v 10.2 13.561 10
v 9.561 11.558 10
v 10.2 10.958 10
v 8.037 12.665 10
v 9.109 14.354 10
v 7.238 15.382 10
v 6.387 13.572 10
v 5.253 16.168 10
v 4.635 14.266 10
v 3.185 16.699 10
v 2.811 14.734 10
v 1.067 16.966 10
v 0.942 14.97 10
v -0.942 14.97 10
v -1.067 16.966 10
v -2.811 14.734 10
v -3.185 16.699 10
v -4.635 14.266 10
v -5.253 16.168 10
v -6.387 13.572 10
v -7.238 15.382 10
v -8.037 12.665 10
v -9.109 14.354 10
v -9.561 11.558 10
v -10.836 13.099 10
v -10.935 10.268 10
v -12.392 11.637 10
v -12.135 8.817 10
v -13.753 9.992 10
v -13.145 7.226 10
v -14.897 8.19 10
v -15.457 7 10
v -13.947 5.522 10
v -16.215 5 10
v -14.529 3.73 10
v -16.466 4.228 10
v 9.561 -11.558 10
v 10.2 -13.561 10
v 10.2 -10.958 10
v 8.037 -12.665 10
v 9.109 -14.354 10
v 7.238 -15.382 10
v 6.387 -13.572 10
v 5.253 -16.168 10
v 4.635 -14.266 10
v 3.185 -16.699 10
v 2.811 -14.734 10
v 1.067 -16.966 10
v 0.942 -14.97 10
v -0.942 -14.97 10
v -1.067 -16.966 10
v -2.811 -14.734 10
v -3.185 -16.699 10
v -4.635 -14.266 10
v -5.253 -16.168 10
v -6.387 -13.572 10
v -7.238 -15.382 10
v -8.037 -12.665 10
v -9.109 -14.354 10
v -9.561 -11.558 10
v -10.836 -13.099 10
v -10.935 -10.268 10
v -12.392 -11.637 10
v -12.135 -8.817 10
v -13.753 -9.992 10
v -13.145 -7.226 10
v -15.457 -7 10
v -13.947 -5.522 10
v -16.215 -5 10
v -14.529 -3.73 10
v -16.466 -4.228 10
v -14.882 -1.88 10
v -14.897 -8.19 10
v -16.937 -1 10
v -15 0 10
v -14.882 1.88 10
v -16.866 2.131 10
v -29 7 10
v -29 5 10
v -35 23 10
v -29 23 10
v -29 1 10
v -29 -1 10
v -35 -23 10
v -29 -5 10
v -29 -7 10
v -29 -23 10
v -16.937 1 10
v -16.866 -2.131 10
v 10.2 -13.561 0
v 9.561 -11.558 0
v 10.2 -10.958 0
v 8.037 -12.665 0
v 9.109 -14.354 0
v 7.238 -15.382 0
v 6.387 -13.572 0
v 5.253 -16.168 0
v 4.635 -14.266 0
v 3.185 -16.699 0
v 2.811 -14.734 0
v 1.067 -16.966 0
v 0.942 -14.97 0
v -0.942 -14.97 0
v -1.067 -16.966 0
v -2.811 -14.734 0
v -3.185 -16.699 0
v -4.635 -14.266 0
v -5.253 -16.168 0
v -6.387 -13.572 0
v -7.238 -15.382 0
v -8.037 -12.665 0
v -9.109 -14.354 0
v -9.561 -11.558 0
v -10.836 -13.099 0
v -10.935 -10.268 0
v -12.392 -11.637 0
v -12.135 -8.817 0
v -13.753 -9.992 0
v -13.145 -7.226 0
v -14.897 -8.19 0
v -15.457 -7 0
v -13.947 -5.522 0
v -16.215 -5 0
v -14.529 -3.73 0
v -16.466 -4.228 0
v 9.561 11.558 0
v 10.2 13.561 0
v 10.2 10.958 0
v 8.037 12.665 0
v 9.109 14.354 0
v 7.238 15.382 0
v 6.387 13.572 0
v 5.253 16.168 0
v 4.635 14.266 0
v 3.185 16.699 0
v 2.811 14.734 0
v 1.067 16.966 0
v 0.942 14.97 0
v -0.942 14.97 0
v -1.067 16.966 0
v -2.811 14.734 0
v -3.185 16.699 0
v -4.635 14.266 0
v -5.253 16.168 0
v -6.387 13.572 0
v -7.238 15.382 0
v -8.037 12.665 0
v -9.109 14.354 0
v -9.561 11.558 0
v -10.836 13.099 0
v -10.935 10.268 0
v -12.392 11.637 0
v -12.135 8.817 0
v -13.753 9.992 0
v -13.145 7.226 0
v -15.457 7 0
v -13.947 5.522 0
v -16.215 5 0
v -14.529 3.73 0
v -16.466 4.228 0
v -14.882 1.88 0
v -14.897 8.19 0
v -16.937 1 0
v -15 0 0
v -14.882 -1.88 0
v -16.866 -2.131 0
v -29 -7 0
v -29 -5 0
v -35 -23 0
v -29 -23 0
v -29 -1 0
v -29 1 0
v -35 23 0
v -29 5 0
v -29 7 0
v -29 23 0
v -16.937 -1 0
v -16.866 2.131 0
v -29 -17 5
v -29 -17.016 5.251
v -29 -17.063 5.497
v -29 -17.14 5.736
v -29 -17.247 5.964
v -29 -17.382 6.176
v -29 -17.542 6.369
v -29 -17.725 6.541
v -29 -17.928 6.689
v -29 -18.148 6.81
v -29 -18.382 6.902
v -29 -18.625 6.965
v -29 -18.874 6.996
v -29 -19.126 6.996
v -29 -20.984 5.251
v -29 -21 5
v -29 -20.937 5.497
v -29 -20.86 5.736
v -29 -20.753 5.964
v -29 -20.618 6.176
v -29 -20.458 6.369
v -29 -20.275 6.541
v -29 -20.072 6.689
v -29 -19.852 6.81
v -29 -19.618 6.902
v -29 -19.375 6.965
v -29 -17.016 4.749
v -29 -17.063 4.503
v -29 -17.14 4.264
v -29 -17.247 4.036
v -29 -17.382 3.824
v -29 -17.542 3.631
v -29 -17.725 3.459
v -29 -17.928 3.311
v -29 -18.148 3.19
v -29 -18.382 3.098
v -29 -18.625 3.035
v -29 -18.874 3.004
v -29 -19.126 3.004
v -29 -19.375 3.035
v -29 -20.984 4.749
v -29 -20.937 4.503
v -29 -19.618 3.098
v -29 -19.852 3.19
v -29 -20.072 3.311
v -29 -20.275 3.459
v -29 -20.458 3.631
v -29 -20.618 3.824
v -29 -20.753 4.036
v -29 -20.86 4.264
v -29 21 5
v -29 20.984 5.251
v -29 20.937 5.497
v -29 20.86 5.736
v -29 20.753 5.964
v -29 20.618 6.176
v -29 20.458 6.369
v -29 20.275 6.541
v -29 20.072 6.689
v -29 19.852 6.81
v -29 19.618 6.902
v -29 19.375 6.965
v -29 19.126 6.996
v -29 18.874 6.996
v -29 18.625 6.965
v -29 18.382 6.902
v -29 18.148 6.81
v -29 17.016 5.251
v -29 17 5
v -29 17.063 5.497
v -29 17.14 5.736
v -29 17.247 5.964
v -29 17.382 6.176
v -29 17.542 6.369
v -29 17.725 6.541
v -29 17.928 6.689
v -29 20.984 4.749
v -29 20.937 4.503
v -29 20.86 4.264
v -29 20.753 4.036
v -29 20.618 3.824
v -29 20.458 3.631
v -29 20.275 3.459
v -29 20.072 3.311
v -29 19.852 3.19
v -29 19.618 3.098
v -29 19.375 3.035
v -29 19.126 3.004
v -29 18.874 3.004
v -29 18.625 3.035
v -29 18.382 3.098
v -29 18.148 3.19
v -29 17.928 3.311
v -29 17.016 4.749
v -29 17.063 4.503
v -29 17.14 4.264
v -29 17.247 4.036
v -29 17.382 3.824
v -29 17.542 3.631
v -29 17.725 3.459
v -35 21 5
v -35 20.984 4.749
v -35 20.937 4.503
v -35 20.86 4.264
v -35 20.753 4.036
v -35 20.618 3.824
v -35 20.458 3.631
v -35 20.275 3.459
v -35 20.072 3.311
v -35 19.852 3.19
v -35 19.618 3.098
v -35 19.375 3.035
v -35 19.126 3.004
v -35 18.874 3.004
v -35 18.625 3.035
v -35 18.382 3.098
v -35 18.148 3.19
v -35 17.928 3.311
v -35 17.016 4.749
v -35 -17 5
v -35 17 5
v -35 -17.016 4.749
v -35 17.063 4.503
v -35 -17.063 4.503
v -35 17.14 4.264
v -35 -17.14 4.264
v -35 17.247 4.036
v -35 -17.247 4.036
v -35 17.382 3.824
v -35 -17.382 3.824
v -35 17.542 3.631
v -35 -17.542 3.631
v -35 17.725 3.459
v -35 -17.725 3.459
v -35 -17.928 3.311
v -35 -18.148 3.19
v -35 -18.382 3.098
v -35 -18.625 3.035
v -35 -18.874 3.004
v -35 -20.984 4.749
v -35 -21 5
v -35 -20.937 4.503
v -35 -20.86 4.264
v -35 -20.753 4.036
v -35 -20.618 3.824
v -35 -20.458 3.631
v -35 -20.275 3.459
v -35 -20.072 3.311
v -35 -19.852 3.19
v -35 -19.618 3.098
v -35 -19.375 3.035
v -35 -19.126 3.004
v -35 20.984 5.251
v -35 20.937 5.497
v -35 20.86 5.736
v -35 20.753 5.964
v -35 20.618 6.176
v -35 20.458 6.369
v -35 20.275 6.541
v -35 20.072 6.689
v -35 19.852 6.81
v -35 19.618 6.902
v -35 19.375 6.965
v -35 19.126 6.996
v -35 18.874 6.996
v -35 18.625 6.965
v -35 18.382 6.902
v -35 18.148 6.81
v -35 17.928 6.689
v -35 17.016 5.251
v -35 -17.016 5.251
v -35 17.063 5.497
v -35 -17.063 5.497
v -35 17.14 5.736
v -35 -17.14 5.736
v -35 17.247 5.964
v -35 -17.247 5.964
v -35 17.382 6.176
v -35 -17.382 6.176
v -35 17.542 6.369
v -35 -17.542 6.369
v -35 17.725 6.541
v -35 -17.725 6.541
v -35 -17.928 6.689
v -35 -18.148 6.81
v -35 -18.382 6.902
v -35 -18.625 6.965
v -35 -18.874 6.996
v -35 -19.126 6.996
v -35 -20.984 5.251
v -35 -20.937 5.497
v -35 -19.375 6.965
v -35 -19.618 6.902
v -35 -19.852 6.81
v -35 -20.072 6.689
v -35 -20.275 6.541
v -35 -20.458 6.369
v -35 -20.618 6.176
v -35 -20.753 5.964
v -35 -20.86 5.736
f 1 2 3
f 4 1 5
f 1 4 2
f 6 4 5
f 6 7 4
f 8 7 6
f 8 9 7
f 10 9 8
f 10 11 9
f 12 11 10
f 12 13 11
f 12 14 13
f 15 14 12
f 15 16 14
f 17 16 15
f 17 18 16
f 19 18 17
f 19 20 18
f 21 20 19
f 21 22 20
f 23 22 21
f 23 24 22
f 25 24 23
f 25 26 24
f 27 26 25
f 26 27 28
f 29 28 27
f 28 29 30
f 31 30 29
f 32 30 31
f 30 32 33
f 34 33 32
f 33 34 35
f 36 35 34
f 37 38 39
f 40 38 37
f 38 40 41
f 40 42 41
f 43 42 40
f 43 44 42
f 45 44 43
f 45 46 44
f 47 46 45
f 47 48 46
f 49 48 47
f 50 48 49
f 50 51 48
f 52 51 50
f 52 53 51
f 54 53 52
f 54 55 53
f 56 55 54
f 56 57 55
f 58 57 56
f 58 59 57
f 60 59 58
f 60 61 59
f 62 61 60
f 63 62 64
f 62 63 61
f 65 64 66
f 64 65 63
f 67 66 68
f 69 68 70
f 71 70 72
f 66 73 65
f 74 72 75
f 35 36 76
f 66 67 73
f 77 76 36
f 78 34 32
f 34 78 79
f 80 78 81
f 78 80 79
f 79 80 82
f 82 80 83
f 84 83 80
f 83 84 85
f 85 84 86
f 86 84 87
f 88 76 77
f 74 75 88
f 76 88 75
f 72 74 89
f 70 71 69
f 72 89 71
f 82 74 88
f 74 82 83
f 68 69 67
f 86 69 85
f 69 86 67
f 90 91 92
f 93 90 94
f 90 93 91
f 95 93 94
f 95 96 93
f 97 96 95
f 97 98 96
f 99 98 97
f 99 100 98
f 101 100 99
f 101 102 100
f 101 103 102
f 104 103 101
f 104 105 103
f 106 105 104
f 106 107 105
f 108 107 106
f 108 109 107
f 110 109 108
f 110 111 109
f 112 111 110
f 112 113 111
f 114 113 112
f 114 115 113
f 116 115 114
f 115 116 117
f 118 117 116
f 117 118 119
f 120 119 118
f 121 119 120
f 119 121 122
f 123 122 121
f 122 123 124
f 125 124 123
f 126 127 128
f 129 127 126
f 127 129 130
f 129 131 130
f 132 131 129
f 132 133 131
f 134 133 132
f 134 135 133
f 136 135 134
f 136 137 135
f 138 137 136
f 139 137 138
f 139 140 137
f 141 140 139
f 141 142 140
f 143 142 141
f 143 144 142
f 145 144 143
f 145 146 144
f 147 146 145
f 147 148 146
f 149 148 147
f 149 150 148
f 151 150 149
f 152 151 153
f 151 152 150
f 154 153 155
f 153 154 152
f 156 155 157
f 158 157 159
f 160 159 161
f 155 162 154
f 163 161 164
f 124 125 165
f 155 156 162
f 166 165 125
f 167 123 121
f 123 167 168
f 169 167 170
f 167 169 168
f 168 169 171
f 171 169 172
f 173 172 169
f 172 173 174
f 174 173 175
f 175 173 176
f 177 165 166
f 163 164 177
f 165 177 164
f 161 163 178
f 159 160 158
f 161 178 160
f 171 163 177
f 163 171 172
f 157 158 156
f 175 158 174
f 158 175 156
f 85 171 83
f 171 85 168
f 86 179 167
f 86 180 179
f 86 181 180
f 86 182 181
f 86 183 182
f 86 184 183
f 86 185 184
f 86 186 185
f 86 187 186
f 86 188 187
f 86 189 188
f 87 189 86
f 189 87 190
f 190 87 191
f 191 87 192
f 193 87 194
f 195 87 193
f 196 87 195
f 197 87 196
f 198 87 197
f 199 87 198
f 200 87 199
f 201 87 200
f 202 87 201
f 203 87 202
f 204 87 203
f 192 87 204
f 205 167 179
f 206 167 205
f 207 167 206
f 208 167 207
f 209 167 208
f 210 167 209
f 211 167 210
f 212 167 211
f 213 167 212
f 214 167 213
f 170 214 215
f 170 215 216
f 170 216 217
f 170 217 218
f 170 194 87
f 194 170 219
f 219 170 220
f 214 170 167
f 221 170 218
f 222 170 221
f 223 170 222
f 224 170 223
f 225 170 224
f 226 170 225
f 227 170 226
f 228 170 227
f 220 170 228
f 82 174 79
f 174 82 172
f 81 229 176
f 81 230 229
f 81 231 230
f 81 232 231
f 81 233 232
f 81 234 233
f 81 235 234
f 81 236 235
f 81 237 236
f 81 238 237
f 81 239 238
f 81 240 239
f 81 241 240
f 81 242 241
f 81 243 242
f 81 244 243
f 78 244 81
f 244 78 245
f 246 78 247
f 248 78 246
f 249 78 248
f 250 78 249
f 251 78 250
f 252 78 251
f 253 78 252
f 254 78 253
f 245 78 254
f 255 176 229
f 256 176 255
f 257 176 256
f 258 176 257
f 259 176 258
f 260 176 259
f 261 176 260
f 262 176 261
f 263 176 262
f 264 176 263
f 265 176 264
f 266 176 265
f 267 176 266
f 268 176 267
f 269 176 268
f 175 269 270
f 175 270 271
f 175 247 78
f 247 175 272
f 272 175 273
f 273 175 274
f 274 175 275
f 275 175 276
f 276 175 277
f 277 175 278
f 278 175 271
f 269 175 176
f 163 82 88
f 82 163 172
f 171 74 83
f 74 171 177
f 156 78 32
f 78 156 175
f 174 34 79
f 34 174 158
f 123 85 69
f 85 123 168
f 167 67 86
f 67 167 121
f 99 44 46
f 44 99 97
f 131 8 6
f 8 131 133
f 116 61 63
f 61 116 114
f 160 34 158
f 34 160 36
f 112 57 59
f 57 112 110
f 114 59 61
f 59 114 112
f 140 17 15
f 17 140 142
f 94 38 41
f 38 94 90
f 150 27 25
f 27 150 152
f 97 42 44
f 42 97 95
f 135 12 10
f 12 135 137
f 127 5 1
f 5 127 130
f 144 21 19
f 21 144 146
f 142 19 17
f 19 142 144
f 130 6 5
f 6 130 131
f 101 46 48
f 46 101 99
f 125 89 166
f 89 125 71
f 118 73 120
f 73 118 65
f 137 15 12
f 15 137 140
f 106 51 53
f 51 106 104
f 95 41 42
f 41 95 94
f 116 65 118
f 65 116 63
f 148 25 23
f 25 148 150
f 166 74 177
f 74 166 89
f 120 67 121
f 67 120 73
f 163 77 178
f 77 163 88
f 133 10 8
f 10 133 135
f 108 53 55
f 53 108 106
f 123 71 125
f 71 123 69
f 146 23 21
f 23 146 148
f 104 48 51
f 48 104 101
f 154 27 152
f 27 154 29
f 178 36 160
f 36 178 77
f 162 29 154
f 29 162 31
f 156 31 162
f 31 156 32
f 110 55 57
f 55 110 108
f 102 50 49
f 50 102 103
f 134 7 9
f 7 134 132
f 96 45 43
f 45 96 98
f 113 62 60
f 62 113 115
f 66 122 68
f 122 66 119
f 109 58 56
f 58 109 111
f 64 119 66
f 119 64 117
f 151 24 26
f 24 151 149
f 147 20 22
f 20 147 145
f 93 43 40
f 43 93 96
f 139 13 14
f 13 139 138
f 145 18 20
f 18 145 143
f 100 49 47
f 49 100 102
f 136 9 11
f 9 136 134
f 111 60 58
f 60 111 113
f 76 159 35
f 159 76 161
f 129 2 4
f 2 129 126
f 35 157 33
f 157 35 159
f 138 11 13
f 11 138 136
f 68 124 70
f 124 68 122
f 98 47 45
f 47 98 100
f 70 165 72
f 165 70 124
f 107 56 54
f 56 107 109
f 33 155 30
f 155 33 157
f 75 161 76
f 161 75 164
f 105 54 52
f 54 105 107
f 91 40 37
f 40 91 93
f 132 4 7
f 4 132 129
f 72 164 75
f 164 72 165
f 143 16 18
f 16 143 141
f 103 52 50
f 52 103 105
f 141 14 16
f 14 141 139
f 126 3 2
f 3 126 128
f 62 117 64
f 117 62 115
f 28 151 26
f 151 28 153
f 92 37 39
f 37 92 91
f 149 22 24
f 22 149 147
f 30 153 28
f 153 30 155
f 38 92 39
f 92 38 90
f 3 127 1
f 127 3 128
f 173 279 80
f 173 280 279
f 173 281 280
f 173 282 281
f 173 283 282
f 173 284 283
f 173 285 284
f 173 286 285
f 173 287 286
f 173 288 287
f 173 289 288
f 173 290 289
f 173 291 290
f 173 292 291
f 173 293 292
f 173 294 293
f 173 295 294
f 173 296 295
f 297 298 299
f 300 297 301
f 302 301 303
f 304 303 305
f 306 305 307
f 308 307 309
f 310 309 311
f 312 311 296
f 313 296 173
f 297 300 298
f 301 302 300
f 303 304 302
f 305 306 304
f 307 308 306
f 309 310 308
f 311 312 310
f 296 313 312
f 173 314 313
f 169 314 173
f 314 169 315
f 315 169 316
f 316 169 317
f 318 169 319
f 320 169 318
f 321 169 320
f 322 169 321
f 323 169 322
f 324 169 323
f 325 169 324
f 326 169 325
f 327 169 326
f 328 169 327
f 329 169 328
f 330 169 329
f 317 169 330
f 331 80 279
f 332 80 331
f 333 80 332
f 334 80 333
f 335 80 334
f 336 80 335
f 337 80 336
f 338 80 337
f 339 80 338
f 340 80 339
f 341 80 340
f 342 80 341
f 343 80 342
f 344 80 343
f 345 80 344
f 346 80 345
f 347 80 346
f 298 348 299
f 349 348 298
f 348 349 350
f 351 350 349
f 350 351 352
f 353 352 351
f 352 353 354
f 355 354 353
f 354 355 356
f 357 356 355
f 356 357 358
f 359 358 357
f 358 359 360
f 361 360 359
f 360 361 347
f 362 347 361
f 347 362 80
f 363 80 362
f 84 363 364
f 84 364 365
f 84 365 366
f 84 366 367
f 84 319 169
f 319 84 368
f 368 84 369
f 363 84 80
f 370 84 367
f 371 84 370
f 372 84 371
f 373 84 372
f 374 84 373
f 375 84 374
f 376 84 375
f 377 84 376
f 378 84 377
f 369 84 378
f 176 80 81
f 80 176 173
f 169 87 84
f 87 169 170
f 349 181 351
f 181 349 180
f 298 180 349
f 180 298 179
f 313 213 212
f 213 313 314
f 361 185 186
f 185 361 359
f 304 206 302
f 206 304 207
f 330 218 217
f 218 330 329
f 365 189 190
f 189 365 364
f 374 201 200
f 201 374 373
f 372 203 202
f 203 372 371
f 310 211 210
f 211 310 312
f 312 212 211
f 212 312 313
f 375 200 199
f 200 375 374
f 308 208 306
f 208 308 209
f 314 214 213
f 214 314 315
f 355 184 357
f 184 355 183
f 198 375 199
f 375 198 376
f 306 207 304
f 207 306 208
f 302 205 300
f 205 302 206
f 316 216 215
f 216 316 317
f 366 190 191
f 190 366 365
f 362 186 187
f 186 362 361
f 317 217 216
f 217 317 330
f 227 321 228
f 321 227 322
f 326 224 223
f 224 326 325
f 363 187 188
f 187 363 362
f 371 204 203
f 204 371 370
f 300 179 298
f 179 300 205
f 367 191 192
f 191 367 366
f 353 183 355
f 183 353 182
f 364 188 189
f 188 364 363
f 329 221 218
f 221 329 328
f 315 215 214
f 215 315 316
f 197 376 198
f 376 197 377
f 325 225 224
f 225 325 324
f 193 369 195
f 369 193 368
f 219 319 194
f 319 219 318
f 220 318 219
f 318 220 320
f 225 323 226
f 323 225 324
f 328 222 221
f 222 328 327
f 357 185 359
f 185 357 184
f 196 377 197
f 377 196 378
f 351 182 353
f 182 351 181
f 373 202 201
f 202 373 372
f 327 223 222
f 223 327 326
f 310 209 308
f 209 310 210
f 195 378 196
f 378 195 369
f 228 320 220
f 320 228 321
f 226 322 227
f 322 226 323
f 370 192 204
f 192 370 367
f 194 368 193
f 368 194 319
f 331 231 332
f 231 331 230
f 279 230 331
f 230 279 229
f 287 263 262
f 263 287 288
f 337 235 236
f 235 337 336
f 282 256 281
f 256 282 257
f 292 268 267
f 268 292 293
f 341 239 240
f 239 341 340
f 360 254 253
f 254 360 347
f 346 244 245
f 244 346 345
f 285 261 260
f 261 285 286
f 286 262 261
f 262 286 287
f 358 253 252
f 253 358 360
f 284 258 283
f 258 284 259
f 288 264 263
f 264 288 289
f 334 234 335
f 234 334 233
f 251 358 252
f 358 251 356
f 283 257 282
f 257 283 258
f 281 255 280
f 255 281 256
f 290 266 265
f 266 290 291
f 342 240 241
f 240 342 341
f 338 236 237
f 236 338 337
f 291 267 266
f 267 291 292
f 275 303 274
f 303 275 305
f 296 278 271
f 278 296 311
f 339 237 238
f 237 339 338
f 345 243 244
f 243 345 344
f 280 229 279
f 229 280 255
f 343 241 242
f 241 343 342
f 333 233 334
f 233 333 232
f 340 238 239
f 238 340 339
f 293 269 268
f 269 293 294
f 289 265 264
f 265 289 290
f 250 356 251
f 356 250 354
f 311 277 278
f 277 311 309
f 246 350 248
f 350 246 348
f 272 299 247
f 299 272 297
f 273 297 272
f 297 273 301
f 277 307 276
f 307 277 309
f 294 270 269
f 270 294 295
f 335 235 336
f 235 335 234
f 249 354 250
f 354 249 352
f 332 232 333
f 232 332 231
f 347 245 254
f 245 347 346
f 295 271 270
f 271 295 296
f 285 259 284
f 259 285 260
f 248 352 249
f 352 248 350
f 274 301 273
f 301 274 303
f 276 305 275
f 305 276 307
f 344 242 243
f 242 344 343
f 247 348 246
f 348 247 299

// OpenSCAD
/*kitchen plinth clip feb 2016 Glyn Cowles */
// diameter of pole
diam=30;
// clip height
ht=10; 
//percentage amount to cut off circle to form clip
cutpc=20;
// length to plinth from pole
len=20;
// thickness of clip
th=2; 
// diam of screw holes
holed=4; 
// base depth
based=6; 
holex=diam+th*2+holed; // distance apart of holes
basew=holex+holed*2; // screw part base width

$fn=50;
assemble();



//-------------------------------------------------
module assemble() {
    clip();     
    translate([-diam/2-len,-basew/2,0]) screwpart();     
}
 
//-------------------------------------------------
module clip() { 
    cut=(diam+2*th)*(cutpc/100);
    difference() {
        union() {
            rotate([0,0,0]) translate([-diam/2-len+based,-th/2,0]) strut();
            cylinder(r=diam/2+th,h=ht);
            }
        cylinder(r=diam/2,h=ht);
        translate([-cut+diam/2+th,-diam/2-th,0]) cube([diam,diam+th*2,ht]);
    }
}
//-------------------------------------------------
module strut() {
    cube([len,th,ht]);
    translate([0,th*3,0]) cube([len,th,ht]);
    translate([0,-th*3,0]) cube([len,th,ht]);
}
//-------------------------------------------------
module screwpart() {
    difference() {
        cube([based,basew,ht]);
        translate([0,-holex/2+basew/2,ht/2]) hol();
        translate([0,holex/2+basew/2,ht/2]) hol();
    }    
}
//-------------------------------------------------
module hol() {
    rotate([90,0,90]) cylinder(h=based,r=holed/2);   
}
//-------------------------------------------------
